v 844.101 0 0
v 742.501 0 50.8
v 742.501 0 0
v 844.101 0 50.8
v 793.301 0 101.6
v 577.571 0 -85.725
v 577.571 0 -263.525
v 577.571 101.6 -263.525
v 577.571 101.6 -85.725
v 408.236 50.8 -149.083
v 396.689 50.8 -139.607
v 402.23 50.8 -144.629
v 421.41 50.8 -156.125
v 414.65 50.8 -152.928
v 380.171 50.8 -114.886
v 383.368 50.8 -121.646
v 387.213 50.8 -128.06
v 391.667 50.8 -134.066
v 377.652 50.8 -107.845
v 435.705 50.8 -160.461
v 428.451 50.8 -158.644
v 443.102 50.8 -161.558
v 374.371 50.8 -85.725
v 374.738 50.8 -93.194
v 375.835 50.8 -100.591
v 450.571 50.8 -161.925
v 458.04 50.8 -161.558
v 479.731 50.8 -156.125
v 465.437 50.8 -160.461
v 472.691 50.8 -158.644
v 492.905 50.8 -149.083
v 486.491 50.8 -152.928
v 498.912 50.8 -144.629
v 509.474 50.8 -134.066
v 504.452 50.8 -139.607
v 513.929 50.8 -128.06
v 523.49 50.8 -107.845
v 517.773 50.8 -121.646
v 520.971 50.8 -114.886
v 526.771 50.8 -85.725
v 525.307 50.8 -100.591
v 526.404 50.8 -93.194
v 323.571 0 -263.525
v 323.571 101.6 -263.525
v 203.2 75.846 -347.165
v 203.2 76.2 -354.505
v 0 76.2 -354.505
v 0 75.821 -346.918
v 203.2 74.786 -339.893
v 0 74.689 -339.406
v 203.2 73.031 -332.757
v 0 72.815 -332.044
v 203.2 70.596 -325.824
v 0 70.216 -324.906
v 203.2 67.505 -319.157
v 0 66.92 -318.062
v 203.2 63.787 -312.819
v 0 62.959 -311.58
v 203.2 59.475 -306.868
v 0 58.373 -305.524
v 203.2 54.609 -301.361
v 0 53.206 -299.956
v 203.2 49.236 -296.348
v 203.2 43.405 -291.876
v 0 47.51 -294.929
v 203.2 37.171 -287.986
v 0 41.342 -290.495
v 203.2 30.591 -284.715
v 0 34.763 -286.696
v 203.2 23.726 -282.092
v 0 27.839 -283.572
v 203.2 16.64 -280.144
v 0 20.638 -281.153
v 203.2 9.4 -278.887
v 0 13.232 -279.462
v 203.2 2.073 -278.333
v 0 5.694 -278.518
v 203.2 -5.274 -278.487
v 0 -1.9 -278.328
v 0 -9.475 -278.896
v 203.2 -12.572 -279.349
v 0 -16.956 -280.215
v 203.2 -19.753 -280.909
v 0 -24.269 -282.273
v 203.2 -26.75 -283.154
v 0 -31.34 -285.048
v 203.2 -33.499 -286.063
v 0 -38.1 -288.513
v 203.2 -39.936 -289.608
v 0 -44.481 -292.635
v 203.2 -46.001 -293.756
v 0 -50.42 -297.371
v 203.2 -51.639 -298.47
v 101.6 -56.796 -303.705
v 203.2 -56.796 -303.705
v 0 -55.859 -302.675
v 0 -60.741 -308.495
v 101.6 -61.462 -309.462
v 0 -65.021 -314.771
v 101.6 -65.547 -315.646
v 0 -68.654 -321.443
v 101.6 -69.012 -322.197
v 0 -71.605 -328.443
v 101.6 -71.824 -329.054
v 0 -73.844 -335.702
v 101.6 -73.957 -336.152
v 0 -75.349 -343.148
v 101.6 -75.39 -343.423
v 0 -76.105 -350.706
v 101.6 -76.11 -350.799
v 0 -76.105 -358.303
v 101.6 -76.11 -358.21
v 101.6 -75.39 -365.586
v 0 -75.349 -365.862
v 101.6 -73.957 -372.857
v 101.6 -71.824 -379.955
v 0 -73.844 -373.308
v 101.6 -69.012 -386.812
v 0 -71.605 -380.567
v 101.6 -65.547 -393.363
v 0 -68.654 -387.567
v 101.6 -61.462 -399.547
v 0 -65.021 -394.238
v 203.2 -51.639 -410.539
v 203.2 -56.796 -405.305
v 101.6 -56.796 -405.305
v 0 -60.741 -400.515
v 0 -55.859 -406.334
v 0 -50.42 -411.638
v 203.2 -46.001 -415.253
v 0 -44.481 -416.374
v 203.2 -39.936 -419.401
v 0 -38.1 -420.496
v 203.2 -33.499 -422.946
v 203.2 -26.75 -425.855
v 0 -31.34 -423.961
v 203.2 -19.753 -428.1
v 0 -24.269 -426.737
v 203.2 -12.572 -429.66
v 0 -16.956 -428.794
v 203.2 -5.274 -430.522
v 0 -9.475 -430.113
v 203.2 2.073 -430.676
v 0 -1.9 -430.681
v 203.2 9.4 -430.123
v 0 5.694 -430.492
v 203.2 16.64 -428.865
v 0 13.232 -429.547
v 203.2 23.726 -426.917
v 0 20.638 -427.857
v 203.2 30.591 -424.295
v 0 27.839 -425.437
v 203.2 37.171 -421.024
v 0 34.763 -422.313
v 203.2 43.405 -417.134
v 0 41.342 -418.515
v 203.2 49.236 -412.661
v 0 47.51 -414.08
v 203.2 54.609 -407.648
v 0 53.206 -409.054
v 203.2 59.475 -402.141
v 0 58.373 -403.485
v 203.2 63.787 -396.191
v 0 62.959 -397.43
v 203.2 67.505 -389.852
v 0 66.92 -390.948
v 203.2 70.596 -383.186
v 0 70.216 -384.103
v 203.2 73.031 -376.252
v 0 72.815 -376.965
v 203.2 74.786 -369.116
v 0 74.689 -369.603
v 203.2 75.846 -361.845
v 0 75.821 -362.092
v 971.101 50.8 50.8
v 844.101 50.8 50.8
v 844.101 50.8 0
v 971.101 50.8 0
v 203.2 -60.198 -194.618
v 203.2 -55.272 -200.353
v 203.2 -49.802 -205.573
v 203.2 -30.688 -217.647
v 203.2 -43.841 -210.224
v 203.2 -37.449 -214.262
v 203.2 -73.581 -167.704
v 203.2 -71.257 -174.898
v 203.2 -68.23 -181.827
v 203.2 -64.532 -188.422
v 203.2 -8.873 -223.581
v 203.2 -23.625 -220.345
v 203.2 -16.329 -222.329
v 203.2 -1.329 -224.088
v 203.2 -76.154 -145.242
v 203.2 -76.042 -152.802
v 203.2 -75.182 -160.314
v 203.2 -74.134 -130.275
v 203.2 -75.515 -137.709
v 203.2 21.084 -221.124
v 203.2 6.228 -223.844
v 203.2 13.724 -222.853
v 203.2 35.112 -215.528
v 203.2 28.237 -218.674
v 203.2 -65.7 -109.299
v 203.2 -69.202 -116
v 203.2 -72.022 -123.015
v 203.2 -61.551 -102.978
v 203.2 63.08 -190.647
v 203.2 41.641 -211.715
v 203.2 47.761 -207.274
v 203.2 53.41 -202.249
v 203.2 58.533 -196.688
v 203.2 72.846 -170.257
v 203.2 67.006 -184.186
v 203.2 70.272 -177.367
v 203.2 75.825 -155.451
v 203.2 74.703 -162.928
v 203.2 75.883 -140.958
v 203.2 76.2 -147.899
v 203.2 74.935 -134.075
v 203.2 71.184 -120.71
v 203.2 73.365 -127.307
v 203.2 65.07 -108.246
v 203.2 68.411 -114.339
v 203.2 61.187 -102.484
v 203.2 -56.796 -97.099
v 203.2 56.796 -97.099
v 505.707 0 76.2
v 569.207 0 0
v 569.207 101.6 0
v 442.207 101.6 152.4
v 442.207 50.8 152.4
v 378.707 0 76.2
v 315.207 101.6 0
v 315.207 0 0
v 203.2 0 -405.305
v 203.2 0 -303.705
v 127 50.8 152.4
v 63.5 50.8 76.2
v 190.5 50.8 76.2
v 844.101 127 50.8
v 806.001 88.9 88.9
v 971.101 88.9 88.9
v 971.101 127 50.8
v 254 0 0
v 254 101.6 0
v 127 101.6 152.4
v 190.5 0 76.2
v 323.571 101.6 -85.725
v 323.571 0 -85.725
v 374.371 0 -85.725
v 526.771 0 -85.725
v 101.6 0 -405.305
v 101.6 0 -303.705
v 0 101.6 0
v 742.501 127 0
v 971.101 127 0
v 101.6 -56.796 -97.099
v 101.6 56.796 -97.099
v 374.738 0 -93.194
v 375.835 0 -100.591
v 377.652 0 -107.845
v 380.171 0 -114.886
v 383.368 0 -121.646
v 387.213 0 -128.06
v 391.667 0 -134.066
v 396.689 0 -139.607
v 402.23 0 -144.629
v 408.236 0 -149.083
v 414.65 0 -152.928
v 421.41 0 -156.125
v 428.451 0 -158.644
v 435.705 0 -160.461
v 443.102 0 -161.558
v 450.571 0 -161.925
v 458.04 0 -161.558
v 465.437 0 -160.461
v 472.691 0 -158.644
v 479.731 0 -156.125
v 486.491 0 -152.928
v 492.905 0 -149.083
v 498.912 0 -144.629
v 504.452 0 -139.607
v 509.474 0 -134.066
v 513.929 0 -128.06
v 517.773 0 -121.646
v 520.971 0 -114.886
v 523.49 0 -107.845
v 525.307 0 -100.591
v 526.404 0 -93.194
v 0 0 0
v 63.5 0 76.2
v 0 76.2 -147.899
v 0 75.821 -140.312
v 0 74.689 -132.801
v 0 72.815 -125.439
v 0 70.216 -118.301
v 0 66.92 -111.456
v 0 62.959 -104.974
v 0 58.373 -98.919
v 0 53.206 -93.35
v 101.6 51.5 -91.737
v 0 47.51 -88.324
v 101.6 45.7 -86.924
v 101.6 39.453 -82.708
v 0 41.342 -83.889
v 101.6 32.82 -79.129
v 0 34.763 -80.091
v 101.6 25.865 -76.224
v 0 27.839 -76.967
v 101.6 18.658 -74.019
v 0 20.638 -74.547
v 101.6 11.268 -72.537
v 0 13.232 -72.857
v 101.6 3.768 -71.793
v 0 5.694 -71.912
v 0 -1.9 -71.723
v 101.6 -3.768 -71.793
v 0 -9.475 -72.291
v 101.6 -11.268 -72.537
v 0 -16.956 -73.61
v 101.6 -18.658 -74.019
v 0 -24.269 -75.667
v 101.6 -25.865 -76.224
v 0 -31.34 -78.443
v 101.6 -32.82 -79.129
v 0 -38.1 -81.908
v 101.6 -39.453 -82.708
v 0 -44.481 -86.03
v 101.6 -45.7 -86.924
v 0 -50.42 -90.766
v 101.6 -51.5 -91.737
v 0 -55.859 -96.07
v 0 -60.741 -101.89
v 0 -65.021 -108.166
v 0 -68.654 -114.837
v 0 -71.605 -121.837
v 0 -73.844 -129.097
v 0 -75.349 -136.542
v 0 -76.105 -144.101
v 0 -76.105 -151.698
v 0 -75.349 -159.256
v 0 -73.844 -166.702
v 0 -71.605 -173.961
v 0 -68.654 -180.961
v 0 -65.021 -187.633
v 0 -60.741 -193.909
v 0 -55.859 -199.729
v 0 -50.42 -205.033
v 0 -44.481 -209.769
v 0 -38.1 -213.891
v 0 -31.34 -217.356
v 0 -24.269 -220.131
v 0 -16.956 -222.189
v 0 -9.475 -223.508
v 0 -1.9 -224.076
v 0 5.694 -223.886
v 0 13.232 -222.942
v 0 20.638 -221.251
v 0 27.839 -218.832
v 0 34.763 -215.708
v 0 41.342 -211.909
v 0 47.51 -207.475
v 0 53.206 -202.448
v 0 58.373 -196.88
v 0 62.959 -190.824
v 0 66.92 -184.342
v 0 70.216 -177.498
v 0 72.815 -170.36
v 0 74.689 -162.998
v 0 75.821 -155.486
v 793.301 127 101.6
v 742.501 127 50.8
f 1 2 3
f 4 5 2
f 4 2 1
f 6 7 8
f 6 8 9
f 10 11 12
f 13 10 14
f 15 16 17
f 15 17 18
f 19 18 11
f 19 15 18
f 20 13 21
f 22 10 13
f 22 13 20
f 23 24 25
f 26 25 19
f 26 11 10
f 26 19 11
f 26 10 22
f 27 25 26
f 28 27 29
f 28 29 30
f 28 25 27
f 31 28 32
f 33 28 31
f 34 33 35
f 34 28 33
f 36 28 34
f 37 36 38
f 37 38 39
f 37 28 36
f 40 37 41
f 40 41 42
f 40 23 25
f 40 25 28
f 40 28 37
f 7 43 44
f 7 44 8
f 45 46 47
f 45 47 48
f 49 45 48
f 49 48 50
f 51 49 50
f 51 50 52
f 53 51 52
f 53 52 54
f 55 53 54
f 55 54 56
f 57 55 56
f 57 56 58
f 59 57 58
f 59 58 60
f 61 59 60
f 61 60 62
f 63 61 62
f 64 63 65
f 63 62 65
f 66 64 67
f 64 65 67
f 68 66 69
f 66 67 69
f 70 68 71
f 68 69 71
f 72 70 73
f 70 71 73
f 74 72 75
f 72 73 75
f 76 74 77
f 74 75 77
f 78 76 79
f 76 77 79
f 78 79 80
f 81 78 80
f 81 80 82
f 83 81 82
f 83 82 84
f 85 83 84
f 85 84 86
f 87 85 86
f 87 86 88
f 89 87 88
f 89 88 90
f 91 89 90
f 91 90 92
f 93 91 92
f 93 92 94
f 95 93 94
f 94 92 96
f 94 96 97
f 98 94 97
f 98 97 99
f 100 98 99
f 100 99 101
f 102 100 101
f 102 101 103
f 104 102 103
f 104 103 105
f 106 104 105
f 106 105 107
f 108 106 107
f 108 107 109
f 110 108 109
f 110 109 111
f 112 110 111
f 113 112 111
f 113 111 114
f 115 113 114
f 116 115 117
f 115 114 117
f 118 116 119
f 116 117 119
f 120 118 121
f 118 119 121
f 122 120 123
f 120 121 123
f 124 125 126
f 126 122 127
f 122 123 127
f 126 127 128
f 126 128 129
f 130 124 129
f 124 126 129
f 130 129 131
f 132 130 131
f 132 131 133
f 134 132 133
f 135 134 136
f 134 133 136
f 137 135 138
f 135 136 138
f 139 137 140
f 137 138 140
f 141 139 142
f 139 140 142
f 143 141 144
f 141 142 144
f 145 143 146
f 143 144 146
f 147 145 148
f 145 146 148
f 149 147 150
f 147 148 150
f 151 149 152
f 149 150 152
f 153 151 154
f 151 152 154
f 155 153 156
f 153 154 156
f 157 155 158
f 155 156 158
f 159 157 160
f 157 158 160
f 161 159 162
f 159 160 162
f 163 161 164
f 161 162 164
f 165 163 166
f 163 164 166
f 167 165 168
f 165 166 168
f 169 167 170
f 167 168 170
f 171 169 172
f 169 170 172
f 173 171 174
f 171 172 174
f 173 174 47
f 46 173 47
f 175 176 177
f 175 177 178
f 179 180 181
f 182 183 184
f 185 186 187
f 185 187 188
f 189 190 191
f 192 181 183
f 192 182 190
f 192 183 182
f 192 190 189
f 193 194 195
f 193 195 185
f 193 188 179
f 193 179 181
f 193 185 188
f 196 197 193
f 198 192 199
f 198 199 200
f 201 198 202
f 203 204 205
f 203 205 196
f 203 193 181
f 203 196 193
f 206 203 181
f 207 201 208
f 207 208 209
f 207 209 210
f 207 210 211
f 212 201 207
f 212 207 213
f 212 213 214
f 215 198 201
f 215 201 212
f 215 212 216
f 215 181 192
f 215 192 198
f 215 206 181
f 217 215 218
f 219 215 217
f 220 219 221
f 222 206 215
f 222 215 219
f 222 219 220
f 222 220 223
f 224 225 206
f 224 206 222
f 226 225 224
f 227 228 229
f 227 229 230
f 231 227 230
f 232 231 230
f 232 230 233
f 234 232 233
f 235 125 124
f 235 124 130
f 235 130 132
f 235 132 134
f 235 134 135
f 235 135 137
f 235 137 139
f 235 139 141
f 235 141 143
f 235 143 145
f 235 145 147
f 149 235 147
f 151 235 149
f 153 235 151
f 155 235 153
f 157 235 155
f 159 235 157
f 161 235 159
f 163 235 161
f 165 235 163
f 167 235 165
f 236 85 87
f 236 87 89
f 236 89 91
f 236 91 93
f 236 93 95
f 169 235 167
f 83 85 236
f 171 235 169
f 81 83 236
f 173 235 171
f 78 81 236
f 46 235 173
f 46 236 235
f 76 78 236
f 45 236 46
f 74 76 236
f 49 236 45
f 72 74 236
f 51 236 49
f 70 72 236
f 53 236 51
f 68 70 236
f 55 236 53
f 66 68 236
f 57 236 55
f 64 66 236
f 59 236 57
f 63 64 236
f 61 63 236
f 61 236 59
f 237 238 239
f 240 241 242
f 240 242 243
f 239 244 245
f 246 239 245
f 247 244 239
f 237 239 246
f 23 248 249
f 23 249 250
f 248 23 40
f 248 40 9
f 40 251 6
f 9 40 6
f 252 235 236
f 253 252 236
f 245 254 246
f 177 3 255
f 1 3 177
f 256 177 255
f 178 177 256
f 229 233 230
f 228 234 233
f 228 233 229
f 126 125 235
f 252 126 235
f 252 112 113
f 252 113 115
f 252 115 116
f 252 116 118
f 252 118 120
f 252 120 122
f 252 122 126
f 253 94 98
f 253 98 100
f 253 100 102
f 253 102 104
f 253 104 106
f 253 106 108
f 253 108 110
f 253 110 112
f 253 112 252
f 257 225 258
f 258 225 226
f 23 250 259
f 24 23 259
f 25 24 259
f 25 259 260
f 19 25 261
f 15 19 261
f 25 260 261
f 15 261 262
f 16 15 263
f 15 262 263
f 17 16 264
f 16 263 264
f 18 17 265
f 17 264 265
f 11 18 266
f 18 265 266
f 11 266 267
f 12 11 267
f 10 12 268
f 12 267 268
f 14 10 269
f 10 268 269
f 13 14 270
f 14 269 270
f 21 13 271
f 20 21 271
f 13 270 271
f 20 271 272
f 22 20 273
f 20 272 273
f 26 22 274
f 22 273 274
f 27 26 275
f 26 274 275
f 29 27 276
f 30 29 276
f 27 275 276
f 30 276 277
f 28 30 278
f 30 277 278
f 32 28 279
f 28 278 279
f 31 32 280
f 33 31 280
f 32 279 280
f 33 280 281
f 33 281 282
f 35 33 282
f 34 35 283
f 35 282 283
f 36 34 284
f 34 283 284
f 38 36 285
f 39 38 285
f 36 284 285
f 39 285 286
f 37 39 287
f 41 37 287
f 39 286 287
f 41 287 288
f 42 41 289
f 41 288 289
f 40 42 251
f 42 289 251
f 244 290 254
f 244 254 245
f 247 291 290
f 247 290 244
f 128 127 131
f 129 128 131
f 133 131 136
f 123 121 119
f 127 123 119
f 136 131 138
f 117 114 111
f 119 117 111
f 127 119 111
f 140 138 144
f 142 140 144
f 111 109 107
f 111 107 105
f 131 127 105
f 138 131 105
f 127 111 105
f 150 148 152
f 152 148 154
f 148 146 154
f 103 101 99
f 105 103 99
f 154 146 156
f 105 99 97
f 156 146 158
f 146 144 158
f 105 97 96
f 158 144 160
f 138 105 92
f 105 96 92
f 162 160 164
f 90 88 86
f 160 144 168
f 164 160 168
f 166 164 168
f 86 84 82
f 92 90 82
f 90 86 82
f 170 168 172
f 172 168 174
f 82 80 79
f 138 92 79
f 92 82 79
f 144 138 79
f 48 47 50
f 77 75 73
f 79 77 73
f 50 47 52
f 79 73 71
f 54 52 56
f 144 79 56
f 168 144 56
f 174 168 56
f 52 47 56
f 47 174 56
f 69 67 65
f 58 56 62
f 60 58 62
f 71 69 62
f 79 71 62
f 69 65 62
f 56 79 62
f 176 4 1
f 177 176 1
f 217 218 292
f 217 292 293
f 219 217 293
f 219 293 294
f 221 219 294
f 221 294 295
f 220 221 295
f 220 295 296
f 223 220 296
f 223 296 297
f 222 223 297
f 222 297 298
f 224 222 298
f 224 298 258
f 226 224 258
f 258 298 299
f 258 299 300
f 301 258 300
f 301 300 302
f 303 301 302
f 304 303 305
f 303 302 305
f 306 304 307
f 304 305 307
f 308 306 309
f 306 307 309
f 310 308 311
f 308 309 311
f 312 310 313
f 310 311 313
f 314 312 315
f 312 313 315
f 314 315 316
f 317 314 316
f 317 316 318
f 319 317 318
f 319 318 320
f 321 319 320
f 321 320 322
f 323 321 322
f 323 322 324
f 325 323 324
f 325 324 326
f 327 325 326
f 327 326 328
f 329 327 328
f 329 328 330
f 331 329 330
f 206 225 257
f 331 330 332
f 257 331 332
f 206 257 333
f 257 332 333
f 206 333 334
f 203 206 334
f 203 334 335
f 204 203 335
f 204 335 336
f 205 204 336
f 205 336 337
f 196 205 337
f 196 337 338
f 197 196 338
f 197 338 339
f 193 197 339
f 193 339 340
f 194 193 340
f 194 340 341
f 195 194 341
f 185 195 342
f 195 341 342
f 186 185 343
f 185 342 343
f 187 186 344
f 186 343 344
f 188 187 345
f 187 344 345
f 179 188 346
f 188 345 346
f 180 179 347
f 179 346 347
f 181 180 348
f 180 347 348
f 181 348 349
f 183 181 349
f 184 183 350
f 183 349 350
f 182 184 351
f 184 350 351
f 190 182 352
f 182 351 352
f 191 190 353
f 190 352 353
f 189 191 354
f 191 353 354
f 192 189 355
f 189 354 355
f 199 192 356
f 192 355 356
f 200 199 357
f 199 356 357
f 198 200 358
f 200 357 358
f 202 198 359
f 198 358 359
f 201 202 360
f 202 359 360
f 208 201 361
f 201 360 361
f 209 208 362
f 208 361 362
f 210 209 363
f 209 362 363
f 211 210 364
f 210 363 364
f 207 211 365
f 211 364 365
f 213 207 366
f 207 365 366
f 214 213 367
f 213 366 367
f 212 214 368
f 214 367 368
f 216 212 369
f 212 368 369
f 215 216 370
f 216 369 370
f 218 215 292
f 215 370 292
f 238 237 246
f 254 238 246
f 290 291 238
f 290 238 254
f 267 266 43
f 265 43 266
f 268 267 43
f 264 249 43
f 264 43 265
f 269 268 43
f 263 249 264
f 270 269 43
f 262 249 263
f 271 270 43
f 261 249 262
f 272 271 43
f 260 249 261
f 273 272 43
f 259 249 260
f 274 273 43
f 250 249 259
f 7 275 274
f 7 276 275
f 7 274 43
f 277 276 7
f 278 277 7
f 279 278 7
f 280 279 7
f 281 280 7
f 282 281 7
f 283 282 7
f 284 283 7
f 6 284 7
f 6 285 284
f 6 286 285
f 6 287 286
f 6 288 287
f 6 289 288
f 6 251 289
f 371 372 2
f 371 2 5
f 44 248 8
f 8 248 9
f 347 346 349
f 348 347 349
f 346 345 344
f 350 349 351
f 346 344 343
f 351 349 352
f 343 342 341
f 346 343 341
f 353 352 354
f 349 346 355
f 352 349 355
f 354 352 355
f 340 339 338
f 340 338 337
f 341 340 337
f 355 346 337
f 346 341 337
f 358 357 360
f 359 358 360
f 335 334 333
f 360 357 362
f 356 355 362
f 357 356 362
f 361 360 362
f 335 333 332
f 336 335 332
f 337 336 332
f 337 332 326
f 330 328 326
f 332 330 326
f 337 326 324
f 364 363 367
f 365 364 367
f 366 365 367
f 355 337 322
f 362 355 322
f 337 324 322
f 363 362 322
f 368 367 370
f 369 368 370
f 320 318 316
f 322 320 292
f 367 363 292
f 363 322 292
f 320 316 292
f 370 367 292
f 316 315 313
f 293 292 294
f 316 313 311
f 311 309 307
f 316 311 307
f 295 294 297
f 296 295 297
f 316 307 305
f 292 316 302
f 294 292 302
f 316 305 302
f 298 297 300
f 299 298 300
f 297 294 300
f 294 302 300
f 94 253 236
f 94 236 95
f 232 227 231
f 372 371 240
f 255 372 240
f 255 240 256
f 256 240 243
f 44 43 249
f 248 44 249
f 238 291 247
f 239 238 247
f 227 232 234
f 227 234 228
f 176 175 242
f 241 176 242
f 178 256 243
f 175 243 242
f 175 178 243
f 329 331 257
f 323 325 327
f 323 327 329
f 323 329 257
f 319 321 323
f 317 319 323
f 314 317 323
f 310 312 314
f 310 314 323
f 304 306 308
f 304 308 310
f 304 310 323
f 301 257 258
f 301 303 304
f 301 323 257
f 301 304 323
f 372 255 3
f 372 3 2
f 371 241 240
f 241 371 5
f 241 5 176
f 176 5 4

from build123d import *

# Parameters (mm, degrees)
F1_DEPTH  = 101.6
F3_DEPTH  = 50.8
F5_DEPTH  = 101.6
F9_DEPTH  = 70.612
F10_W     = 228.6
F10_H     = 101.6
F11_DEPTH = 127
F13_DEPTH = 139.7
F17_DEPTH = 50.8
F18_DEPTH = 127
F19_DEPTH = 177.8
F20_R     = 76.2
F21_DEPTH = 203.2
F23_DEPTH = 101.6
F24_R     = 76.2
F25_DEPTH = 203.2
F27_DEPTH = 101.6
F28_W     = 254
F28_H     = 177.8
F29_DEPTH = 101.6
F31_DEPTH = 50.8


with BuildPart() as f1:
    # F0 (on Front) → F1 (new body)
    with BuildSketch(Plane.XZ):
        Polygon((127, 152.4), (0, 0), (254, 0), align=None)
    extrude(amount=-F1_DEPTH)

    # F2 (on face) → F3 (cut)
    with BuildSketch(Plane.XZ):
        Polygon((63.5, 76.2), (127, 76.2), (190.5, 76.2), (127, 152.4), align=None)
    extrude(amount=-F3_DEPTH, mode=Mode.SUBTRACT)


with BuildPart() as f5:
    # F4 (on Front) → F5 (new body)
    with BuildSketch(Plane.XZ):
        Polygon((442.2074718067, 152.4), (315.2074718067, 0), (569.2074718067, 0), align=None)
    extrude(amount=-F5_DEPTH)

    # F8 (on face) → F9 (cut, symmetric)
    with BuildSketch(Plane.YZ.offset(442.2074718067)):
        Polygon((50.8, 152.4), (0, 152.4), (0, 76.2), align=None)
    extrude(amount=F9_DEPTH, both=True, mode=Mode.SUBTRACT)


with BuildPart() as f11:
    # F10 (on Front) → F11 (new body)
    with BuildSketch(Plane.XZ):
        with Locations((856.8012001758, 50.8)):
            Rectangle(F10_W, F10_H)
    extrude(amount=-F11_DEPTH)

    # F12 (on face) → F13 (cut)
    with BuildSketch(Plane.XZ):
        Polygon((844.1012001758, 101.6), (793.3012001758, 101.6), (844.1012001758, 50.8), align=None)
        Polygon((793.3012001758, 101.6), (742.5012001758, 101.6), (742.5012001758, 50.8), align=None)
    extrude(amount=-F13_DEPTH, mode=Mode.SUBTRACT)

    # F14 (on face) → F17 (cut)
    with BuildSketch(Plane.XZ):
        Polygon((844.1012001758, 101.6), (844.1012001758, 50.8), (844.1012001758, 0), (971.1012001758, 0), (971.1012001758, 50.8), (971.1012001758, 101.6), align=None)
    extrude(amount=-F17_DEPTH, mode=Mode.SUBTRACT)

    # F15 (on face) → F18 (cut)
    with BuildSketch(Plane.YZ.offset(971.1012001758)):
        Polygon((50.8, 0), (50.8, 50.8), (88.9, 88.9), (127, 50.8), (127, 101.6), (0, 101.6), (0, 0), align=None)
    extrude(amount=-F18_DEPTH, mode=Mode.SUBTRACT)

    # F16 (on face) → F19 (join)
    with BuildSketch(Plane.YZ.offset(971.1012001758)):
        Polygon((88.9, 88.9), (50.8, 50.8), (50.8, 0), (127, 0), (127, 50.8), align=None)
    extrude(amount=-F19_DEPTH)


with BuildPart() as f21:
    # F20 (on Right) → F21 (new body)
    with BuildSketch(Plane.YZ):
        with Locations((0, -147.8994190693)):
            Circle(F20_R)
    extrude(amount=F21_DEPTH)

    # F22 (on face) → F23 (cut)
    with BuildSketch(Plane.YZ.offset(203.2)):
        with BuildLine():
            Line((-56.7961266285, -97.0994190693), (0, -97.0994190693))
            Line((0, -97.0994190693), (56.7961266285, -97.0994190693))
            ThreePointArc((56.7961266285, -97.0994190693), (0, -71.6994190693), (-56.7961266285, -97.0994190693))
        make_face()
    extrude(amount=-F23_DEPTH, mode=Mode.SUBTRACT)


with BuildPart() as f25:
    # F24 (on Right) → F25 (new body)
    with BuildSketch(Plane.YZ):
        with Locations((0, -354.5046203547)):
            Circle(F24_R)
    extrude(amount=F25_DEPTH)

    # F26 (on face) → F27 (cut)
    with BuildSketch(Plane.YZ.offset(203.2)):
        with BuildLine():
            Line((0, -405.3046203547), (0, -354.5046203547))
            Line((0, -354.5046203547), (0, -303.7046203547))
            Line((0, -303.7046203547), (-56.7961266285, -303.7046203547))
            ThreePointArc((-56.7961266285, -303.7046203547), (-76.2, -354.5046203547), (-56.7961266285, -405.3046203547))
            Line((-56.7961266285, -405.3046203547), (0, -405.3046203547))
        make_face()
    extrude(amount=-F27_DEPTH, mode=Mode.SUBTRACT)


with BuildPart() as f29:
    # F28 (on Front) → F29 (new body)
    with BuildSketch(Plane.XZ):
        with Locations((450.5708919574, -174.6254190803)):
            Rectangle(F28_W, F28_H)
    extrude(amount=-F29_DEPTH)

    # F30 (on face) → F31 (cut)
    with BuildSketch(Plane.XZ):
        with BuildLine():
            ThreePointArc((374.3708919574, -85.7254190803), (450.5708919574, -161.9254190803), (526.7708919574, -85.7254190803))
            Line((526.7708919574, -85.7254190803), (374.3708919574, -85.7254190803))
        make_face()
    extrude(amount=-F31_DEPTH, mode=Mode.SUBTRACT)


solid = Compound([f1.part, f5.part, f11.part, f21.part, f25.part, f29.part])
